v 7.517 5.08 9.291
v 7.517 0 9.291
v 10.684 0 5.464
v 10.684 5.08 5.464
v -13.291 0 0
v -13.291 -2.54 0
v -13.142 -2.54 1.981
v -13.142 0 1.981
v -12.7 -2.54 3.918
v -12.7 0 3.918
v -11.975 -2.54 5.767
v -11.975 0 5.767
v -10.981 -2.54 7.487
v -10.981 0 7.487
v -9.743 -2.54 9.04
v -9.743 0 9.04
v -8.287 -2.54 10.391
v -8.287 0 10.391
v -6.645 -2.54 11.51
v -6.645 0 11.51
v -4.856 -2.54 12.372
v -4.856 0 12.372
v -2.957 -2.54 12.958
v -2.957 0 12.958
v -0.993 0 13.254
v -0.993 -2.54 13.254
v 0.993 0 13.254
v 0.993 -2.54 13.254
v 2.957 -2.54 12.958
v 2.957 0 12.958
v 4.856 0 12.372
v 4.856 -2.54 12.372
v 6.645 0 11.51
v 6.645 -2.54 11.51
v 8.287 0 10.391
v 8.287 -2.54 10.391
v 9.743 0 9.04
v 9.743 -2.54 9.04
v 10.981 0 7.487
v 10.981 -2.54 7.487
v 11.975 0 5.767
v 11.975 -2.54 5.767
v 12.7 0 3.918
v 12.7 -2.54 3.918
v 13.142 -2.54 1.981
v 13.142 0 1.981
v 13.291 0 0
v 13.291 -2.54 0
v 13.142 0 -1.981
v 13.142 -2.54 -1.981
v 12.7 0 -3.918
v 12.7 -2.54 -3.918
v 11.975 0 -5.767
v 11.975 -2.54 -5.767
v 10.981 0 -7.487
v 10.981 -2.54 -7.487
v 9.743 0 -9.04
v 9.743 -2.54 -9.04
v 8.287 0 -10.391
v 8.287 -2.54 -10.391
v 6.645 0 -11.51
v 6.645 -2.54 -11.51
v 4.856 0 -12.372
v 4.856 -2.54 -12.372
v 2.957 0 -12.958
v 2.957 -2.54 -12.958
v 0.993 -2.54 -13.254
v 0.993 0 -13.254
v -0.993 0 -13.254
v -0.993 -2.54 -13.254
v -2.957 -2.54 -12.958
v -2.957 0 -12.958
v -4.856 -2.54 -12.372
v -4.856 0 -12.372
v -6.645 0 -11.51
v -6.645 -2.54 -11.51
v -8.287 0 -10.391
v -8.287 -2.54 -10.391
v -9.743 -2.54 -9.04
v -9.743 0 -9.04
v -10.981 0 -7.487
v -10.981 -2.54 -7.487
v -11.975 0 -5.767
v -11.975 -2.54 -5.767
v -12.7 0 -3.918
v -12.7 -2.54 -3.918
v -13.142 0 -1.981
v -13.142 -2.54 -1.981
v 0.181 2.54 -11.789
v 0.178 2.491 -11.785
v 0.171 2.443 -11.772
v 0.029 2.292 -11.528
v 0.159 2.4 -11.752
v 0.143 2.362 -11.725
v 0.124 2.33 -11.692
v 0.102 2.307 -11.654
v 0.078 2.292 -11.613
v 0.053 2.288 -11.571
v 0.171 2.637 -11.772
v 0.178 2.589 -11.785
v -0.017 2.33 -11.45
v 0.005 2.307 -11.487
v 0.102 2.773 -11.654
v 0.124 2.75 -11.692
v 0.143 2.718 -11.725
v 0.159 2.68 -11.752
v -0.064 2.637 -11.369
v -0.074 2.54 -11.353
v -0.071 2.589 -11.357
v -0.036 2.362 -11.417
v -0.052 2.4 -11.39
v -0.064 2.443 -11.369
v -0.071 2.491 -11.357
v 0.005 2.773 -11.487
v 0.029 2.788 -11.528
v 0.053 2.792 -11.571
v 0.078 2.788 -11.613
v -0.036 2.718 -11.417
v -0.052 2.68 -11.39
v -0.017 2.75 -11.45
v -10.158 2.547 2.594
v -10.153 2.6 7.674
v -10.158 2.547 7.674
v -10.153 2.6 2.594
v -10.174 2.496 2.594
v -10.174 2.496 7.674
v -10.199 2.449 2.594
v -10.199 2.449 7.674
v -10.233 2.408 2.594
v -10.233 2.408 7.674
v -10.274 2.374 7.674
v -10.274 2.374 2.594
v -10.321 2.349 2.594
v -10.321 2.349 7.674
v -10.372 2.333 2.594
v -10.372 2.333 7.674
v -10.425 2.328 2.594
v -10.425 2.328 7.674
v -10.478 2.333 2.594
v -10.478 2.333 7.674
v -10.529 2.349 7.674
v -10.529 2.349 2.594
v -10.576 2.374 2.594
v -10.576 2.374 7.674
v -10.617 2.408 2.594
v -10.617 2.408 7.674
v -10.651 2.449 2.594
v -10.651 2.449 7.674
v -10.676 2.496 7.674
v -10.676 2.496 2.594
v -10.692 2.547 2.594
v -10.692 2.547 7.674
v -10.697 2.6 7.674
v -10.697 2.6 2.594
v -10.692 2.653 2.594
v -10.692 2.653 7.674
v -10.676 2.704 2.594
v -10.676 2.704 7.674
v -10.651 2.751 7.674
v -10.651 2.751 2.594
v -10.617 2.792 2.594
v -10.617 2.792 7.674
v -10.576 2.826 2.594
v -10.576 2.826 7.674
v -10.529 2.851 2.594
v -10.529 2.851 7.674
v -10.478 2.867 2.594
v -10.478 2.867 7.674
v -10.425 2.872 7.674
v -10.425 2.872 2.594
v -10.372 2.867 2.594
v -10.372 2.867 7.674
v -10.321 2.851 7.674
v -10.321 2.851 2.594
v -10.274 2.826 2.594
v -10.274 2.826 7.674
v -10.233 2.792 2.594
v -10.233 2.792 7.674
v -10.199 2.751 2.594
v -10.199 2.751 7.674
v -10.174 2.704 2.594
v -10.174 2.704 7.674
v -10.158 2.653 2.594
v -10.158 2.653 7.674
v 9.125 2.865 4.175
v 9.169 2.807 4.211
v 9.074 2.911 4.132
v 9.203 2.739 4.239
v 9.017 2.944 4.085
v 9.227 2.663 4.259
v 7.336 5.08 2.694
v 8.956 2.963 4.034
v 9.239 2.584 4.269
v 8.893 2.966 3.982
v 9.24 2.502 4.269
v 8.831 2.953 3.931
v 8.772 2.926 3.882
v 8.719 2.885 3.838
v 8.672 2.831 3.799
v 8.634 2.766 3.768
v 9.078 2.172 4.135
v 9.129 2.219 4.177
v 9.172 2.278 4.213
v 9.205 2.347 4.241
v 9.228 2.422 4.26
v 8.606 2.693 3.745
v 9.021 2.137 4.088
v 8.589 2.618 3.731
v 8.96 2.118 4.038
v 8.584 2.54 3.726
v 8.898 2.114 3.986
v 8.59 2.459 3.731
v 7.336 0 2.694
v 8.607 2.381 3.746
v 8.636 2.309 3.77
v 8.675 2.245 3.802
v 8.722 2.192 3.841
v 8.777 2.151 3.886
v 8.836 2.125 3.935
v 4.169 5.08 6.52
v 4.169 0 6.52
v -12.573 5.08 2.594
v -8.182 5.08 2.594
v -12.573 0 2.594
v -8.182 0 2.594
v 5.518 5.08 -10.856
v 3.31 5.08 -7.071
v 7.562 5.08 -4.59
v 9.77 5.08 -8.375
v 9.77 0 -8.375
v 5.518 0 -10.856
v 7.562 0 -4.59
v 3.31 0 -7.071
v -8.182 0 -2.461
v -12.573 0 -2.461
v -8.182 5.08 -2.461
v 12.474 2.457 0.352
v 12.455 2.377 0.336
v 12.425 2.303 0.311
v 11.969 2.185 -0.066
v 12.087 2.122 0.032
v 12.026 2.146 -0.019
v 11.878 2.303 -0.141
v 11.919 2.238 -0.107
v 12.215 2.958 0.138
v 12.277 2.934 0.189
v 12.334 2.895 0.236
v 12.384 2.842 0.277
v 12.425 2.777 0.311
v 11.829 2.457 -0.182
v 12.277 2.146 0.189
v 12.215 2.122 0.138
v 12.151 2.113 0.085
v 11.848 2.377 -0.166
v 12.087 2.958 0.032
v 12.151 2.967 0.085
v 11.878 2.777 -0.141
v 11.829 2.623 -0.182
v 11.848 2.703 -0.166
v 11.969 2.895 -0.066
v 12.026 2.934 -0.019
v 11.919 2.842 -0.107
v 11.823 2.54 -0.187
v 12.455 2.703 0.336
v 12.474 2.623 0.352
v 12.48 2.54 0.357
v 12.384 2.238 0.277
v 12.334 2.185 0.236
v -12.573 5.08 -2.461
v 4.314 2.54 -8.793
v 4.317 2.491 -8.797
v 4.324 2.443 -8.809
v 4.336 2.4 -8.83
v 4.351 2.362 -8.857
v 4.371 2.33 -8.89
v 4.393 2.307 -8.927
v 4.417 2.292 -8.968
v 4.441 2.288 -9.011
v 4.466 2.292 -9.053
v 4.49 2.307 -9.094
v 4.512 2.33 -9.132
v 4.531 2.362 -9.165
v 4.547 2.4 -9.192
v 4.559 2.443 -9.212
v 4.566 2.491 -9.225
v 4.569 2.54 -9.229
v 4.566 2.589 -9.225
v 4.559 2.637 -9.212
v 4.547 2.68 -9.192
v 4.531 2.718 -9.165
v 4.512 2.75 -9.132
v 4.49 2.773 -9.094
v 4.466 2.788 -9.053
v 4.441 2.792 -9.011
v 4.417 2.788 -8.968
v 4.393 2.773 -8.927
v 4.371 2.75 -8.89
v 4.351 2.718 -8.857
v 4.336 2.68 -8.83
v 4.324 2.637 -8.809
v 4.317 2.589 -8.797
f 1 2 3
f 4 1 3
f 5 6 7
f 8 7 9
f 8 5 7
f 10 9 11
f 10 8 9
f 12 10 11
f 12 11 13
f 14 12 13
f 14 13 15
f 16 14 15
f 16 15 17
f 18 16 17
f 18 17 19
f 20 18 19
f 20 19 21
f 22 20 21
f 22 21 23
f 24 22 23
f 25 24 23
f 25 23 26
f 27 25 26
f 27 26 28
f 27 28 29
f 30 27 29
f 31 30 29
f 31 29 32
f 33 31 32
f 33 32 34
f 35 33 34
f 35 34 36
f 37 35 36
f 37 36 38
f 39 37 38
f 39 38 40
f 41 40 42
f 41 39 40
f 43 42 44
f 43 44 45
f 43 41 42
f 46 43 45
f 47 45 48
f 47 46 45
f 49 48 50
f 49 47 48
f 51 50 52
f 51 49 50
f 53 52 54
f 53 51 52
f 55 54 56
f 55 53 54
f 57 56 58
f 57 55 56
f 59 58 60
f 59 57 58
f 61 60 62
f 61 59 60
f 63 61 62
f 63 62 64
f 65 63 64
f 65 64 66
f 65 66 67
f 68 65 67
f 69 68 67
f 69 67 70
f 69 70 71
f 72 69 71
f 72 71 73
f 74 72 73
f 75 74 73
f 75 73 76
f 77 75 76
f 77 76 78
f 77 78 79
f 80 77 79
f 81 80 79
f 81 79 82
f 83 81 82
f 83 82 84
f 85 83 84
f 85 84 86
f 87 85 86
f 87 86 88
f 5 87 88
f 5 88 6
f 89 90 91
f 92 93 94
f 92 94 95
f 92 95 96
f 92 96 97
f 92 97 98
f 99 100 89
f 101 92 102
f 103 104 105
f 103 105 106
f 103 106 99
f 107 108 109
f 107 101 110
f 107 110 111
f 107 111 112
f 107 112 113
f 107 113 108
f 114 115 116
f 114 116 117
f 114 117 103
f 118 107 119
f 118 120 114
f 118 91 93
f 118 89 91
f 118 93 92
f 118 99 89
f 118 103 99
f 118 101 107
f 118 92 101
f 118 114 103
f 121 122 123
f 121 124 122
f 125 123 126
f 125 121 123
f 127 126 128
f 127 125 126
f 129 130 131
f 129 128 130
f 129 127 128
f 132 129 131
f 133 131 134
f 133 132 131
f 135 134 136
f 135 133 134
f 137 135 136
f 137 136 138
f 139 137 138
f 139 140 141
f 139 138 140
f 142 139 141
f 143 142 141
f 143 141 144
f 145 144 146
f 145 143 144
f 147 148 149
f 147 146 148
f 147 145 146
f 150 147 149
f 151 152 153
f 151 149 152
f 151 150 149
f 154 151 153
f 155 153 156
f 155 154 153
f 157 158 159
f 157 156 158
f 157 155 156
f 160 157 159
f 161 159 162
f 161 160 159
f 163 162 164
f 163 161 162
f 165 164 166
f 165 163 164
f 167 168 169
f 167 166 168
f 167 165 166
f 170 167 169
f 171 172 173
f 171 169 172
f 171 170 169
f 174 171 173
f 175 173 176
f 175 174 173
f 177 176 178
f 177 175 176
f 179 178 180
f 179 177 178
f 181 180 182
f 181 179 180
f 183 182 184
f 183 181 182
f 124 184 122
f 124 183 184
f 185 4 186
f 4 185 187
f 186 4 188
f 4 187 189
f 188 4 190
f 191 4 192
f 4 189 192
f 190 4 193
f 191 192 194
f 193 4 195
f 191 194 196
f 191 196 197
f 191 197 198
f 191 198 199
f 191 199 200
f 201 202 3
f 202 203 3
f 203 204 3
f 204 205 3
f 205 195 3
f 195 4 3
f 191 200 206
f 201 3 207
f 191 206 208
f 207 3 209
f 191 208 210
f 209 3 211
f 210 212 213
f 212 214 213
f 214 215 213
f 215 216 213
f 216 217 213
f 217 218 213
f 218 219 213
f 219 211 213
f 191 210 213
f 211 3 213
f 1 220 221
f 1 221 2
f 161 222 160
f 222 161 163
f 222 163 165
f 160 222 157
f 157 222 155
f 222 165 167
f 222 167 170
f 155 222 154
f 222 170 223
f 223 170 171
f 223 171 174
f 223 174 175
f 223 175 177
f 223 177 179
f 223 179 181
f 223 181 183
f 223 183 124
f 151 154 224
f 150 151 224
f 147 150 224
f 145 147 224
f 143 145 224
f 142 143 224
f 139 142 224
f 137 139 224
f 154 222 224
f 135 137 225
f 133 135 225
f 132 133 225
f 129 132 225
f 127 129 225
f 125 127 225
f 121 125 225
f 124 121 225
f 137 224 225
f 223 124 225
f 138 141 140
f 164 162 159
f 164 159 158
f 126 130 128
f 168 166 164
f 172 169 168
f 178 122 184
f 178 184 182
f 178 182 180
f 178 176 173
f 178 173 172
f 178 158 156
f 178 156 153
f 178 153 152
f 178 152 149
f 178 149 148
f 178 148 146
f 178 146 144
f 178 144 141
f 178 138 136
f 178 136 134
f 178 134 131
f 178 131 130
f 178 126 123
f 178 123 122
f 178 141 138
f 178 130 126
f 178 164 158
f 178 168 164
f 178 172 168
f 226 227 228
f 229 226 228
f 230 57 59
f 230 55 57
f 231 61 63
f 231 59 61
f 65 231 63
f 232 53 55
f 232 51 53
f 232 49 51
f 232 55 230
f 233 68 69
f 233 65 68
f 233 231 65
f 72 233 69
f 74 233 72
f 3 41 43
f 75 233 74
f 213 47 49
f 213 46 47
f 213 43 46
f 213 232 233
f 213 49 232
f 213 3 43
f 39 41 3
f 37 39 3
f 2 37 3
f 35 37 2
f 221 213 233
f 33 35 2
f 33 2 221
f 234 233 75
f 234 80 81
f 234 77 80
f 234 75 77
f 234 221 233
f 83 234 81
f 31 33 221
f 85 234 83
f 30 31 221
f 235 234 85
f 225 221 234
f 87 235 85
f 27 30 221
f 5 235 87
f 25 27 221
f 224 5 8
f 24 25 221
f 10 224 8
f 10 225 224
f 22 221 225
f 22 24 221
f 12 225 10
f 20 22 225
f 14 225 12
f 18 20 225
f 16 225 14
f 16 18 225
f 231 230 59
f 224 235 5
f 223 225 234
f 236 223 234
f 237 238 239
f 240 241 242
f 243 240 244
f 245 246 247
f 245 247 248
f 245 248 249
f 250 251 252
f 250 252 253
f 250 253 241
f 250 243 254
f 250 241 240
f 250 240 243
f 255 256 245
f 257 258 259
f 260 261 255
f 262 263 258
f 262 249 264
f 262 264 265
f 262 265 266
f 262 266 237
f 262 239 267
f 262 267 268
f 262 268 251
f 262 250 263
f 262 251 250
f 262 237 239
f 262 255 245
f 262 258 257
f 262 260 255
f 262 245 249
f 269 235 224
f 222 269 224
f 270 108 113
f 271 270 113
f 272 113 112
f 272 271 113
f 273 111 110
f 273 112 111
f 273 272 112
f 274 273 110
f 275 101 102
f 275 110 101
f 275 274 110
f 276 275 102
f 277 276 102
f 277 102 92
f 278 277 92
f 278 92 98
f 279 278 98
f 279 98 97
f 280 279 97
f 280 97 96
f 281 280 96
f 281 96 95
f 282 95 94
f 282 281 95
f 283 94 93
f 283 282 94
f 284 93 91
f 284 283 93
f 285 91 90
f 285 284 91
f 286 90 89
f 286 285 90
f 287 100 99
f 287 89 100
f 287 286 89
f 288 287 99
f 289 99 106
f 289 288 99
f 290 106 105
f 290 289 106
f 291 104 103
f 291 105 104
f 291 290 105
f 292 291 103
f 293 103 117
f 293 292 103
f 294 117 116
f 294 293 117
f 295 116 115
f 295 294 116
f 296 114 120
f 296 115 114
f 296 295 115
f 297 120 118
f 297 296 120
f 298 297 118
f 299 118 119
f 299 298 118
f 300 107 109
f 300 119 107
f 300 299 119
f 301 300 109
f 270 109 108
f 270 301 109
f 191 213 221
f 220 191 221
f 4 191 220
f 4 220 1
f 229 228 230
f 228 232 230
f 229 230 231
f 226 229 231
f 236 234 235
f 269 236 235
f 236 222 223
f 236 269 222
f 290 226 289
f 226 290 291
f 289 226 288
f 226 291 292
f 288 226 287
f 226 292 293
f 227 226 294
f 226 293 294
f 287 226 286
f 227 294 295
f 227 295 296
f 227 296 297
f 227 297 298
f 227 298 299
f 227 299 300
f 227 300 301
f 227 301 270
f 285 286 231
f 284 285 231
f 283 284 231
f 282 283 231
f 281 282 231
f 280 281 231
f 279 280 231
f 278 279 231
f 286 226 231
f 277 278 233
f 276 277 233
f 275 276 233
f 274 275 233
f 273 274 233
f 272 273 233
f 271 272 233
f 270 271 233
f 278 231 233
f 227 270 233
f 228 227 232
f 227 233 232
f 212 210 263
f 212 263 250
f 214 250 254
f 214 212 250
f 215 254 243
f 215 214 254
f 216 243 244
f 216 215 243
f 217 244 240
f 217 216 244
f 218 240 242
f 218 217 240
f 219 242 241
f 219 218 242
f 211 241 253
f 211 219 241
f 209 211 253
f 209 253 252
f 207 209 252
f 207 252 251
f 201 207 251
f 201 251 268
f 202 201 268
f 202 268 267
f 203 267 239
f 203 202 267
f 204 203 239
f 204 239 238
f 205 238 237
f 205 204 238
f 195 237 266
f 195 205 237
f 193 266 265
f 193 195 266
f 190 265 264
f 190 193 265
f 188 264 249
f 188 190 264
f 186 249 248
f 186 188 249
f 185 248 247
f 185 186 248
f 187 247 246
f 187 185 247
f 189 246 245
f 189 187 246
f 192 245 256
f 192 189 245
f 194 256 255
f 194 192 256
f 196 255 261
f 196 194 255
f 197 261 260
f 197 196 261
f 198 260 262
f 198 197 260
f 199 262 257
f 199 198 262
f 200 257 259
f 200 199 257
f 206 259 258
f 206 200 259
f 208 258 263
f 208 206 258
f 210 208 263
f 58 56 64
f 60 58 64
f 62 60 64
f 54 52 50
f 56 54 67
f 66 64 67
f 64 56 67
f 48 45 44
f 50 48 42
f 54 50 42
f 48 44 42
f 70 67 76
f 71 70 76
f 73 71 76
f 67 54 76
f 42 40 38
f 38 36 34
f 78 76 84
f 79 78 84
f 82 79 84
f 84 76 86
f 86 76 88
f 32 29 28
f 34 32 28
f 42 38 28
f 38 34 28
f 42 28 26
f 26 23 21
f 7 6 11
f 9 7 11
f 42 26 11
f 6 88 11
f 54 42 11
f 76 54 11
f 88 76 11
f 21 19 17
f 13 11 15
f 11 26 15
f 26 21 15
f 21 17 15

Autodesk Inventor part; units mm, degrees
ref_plane "YZ Plane" through (0, 0, 0) normal (1, 0, 0) x (0, 1, 0)
ref_plane "XZ Plane" through (0, 0, 0) normal (0, 1, 0) x (-1, 0, 0)
ref_plane "XY Plane" through (0, 0, 0) normal (0, 0, 1) x (1, 0, 0)
sketch "Sketch1" plane through (0, 0, 0) normal (0, 1, 0) x (-1, 0, 0)
  circle A0 centre (0, 0) radius 13.2908
  line L0 (0, 0) -> (-6.6454, 11.5102)
  line L1 (0, 0) -> (13.2908, 0) construction
  line L2 (0, 0) -> (-6.6454, -11.5102)
extrude "Extrusion1" add sketch "Sketch1" against normal blind 2.54
sketch "Sketch2" plane through (0, 0, 0) normal (0, 1, 0) x (1, 0, 0)
  line L0 (-12.5731, -2.5944) -> (-8.1825, -2.5944)
  line L1 (-8.1825, -2.5944) -> (-8.1825, 2.4614)
  line L2 (-8.1825, 2.4614) -> (-12.5731, 2.4614)
  line L3 (-12.5731, 2.4614) -> (-12.5731, -2.5944)
  line L4 (4.1689, -6.5202) -> (7.5172, -9.2912)
  line L5 (7.5172, -9.2912) -> (10.6841, -5.4645)
  line L6 (10.6841, -5.4645) -> (7.3357, -2.6935)
  line L7 (7.3357, -2.6935) -> (4.1689, -6.5202)
  line L8 (5.5175, 10.8555) -> (3.3095, 7.0709)
  line L9 (3.3095, 7.0709) -> (7.5616, 4.5902)
  line L10 (7.5616, 4.5902) -> (9.7696, 8.3747)
  line L11 (9.7696, 8.3747) -> (5.5175, 10.8555)
  point P0 (0, 0)
extrude "Extrusion2" add sketch "Sketch2" along normal blind 5.08
sketch "Sketch3" plane through (7.3357, 0, 2.6935) normal (0.6376, 0, -0.7704) x (-0.7704, 0, -0.6376)
  circle A0 centre (-2.0466, 2.54) radius 0.4266
  point P0 (7.3687, 0)
extrude "Extrusion3" add sketch "Sketch3" along normal blind 5.08
sketch "Sketch4" plane through (3.3095, 0, -7.0709) normal (-0.8637, 0, -0.5039) x (-0.5039, 0, 0.8637)
  circle A0 centre (-2.246, 2.54) radius 0.2524
  point P0 (7.7752, 0)
extrude "Extrusion4" add sketch "Sketch4" along normal blind 5.08
sketch "Sketch5" plane through (-12.5731, 0, 2.5944) normal (0, 0, 1) x (1, 0, 0)
  circle A0 centre (2.148, 2.6) radius 0.2719
  point P0 (12.5731, 0)
extrude "Extrusion5" add sketch "Sketch5" along normal blind 5.08
sketch "Sketch6" plane through (0, 0, 0) normal (0, 1, 0) x (1, 0, 0)
  point P0 (0, 0)
properties part number "Base"
